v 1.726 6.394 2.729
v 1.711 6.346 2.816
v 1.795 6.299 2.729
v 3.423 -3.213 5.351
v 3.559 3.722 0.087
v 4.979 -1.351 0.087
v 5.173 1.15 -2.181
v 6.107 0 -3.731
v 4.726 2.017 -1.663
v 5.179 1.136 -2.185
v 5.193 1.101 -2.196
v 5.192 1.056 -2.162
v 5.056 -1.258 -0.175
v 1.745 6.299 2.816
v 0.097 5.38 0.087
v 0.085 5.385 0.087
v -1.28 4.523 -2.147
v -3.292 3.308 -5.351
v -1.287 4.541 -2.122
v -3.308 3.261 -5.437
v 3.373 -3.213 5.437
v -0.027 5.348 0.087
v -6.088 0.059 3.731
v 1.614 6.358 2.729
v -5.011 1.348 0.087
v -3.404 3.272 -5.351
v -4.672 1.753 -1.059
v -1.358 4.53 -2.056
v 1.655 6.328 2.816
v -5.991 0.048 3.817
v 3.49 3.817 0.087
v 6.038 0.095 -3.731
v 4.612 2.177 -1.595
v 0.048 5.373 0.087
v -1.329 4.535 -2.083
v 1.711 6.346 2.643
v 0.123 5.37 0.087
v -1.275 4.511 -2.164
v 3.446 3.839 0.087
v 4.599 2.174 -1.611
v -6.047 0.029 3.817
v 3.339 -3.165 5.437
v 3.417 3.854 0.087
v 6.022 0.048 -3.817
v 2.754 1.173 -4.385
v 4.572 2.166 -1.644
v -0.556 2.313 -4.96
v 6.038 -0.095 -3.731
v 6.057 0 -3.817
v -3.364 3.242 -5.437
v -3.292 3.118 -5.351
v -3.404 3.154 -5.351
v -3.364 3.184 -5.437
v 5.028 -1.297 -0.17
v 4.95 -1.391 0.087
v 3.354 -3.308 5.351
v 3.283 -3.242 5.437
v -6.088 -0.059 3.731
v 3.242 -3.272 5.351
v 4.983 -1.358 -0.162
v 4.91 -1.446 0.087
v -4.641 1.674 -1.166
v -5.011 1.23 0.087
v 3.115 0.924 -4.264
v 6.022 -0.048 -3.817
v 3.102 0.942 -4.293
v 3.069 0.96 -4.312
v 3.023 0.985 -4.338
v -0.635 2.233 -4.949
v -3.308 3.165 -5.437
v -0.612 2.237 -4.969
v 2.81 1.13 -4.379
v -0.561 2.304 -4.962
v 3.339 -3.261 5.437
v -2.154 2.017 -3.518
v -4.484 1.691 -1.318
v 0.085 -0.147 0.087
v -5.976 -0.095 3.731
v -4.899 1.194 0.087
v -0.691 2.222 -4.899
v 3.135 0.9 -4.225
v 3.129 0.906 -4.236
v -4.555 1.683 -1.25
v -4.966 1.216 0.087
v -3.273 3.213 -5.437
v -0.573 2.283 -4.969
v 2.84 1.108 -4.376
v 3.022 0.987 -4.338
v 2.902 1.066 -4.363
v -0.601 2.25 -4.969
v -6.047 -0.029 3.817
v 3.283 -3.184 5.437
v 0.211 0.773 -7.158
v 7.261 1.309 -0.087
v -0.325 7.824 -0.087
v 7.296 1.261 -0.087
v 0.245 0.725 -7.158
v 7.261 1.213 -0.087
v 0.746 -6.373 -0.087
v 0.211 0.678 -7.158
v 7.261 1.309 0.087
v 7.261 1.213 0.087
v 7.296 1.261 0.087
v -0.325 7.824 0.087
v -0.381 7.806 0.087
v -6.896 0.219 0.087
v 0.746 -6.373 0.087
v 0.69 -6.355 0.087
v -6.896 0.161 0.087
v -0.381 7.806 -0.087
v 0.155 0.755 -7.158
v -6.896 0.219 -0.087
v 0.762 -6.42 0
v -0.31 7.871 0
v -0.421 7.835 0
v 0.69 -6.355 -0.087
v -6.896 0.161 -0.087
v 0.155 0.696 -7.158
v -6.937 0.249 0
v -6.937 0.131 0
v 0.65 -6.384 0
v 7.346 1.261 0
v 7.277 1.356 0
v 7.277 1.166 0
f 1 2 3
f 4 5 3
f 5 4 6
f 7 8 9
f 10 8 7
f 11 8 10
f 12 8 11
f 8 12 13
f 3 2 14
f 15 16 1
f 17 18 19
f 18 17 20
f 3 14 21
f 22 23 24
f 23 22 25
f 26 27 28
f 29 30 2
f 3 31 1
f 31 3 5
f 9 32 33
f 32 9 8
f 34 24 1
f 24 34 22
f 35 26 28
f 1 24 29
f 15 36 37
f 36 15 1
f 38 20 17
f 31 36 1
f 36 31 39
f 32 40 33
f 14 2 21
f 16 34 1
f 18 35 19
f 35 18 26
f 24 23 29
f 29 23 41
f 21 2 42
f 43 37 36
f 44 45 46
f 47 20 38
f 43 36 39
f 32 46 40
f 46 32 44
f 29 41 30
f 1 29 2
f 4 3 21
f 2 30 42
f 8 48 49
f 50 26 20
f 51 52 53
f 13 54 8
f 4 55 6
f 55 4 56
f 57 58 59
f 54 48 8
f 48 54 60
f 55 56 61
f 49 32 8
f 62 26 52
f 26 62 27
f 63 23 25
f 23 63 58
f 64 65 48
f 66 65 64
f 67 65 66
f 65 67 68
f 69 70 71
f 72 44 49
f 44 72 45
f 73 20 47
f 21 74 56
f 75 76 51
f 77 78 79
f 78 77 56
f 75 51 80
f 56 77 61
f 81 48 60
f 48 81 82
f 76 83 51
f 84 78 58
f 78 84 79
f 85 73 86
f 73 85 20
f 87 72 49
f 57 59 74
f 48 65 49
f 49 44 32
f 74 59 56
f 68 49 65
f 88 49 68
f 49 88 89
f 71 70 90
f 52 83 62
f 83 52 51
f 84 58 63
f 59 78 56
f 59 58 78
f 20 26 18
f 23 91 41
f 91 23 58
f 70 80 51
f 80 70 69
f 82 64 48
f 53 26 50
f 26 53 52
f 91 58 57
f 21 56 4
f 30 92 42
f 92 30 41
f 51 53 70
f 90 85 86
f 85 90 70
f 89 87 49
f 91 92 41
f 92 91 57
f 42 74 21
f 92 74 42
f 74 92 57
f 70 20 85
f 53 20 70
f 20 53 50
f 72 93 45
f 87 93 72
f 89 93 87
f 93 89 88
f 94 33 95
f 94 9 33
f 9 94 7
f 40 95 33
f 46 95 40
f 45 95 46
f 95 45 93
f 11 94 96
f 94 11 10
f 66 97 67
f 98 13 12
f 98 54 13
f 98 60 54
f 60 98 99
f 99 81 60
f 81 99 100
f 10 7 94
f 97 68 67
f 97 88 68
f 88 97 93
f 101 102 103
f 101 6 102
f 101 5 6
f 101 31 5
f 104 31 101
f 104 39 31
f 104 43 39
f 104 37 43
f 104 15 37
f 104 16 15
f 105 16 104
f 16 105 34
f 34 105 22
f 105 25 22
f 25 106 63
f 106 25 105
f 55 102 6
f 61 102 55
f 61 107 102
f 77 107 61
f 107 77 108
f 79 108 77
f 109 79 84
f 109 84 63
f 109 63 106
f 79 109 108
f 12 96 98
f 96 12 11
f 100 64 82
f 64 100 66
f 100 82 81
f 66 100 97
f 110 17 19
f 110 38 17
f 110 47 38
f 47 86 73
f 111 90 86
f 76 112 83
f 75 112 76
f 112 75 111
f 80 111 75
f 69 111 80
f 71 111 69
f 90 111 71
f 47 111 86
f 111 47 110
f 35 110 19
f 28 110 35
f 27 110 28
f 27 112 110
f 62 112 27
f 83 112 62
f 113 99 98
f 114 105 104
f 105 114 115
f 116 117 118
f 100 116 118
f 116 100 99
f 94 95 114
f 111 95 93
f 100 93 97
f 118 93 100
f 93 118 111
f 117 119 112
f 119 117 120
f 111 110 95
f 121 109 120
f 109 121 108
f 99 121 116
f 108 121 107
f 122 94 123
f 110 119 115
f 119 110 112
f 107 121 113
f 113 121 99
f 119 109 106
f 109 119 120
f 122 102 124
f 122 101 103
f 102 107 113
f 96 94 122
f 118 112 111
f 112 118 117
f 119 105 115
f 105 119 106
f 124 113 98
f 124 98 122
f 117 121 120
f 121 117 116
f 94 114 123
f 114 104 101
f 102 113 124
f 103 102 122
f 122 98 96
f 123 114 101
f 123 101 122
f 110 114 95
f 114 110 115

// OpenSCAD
// Auto-generated OpenSCAD file

    inner_points = 10*[[0.7245880980657288, 0.12609962772758243, 1.0181341605432133e-13], [-0.6855635385041695, 0.018990515700464568, -1.0181341605432133e-13], [0.07306683579433854, -0.6325307465709257, 7.388094116376098e-14], [-0.03404227623277932, 0.7776208899989726, -7.388094116376098e-14], [0.019512279780886727, 0.07254507171395753, -0.7071067811865476]];

    outer_points = 10*[[0.6006779226054043, 0.0, -0.37307644430392006], [-0.6006779226054043, 0.0, 0.37307644430392006], [-0.33233807096506035, 0.3213003592020604, -0.5350864283121461], [0.33233807096506035, -0.3213003592020604, 0.5350864283121461], [0.169521207763744, 0.6298937046650228, 0.2729404347869597]];

    // Convex hull for inner set (I)
    module inner_hull() {
        hull() {
            for (p = inner_points) {
                translate(p) sphere(r=0.1);
            }
        }
    }

    // Convex hull for outer set (O) minus inner hull (O \ I)
    module outer_minus_inner() {
        difference() {
            hull() {
                for (p = outer_points) {
                    translate(p) sphere(r=0.1);
                }
            }
            inner_hull(); // Subtract inner hull
        }
    }

    // Convex hull for outer set (O) minus all translated inner hulls
    module outer_minus_AllTranslationInner() {
        difference() {
            hull() {
                for (p = outer_points) {
                    translate(p) sphere(r=0.1);
                }
            }
            hull() {
                translate([0,0,50]) inner_hull();
                translate([0,0,-50]) inner_hull();
            }; // Subtract translated inner hulls
        }
    }

    // Difference between outer_minus_inner and outer_minus_AllTranslationInner
    module outer_minus_inner_diff() {
        difference() {
            // Outer minus inner
            difference() {
                hull() {
                    for (p = outer_points) {
                        translate(p) sphere(r=0.1);
                    }
                }
                inner_hull();
            }

            // Subtract Outer minus AllTranslationInner
            difference() {
                hull() {
                    for (p = outer_points) {
                        translate(p) sphere(r=0.1);
                    }
                }
                hull() {
                    translate([0,0,50]) inner_hull();
                    translate([0,0,-50]) inner_hull();
                };
            }
        }
    }

    // Rendering all with colors applied
    color([1, 0, 0, 0.5]) inner_hull(); // Transparent red
    color([0, 1, 0, 1]) outer_minus_AllTranslationInner(); // Opaque green
    color([1, 1, 0, 1]) outer_minus_inner_diff(); // Opaque yellow
    
